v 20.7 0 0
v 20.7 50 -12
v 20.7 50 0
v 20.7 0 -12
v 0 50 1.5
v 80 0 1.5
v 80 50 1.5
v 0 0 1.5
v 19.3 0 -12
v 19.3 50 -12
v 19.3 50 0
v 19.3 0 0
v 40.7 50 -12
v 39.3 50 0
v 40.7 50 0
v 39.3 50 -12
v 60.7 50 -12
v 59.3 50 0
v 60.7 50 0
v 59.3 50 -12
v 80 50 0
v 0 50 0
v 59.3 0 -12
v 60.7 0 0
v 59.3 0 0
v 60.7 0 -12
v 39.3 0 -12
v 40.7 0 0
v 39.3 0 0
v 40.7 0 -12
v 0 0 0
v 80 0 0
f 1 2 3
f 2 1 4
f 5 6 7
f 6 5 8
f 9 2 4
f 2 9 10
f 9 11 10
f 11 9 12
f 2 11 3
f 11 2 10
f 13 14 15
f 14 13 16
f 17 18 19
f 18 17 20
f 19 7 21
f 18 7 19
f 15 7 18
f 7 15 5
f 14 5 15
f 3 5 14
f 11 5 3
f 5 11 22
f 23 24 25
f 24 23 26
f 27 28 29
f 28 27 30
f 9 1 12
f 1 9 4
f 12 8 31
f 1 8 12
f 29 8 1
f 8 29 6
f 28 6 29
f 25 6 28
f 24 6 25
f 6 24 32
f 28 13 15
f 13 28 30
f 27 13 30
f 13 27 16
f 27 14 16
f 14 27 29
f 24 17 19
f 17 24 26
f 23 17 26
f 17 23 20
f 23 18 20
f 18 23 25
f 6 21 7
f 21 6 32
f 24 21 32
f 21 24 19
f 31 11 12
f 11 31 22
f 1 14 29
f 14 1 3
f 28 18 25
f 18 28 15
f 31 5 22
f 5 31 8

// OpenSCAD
$fn = 32;

// ----------------------------------------------------------------------
// Ribbed panel: 1.5 mm panel
// ----------------------------------------------------------------------

// --- parameters (mm) ---
panel_l = 80;             // panel length, X
panel_w = 50;             // panel width, Y
panel_t = 1.5;            // panel thickness, Z
rib_t = 1.4;              // rib thickness
rib_h = 12;               // rib height below the panel
ribs = 3;                 // number of ribs

total_h = panel_t + rib_h;  // overall height

union() {
  cube([panel_l, panel_w, panel_t]);
  for (i = [1 : ribs])
    translate([i * panel_l / (ribs + 1) - rib_t / 2, 0, -rib_h])
      cube([rib_t, panel_w, rib_h + panel_t]);
}
